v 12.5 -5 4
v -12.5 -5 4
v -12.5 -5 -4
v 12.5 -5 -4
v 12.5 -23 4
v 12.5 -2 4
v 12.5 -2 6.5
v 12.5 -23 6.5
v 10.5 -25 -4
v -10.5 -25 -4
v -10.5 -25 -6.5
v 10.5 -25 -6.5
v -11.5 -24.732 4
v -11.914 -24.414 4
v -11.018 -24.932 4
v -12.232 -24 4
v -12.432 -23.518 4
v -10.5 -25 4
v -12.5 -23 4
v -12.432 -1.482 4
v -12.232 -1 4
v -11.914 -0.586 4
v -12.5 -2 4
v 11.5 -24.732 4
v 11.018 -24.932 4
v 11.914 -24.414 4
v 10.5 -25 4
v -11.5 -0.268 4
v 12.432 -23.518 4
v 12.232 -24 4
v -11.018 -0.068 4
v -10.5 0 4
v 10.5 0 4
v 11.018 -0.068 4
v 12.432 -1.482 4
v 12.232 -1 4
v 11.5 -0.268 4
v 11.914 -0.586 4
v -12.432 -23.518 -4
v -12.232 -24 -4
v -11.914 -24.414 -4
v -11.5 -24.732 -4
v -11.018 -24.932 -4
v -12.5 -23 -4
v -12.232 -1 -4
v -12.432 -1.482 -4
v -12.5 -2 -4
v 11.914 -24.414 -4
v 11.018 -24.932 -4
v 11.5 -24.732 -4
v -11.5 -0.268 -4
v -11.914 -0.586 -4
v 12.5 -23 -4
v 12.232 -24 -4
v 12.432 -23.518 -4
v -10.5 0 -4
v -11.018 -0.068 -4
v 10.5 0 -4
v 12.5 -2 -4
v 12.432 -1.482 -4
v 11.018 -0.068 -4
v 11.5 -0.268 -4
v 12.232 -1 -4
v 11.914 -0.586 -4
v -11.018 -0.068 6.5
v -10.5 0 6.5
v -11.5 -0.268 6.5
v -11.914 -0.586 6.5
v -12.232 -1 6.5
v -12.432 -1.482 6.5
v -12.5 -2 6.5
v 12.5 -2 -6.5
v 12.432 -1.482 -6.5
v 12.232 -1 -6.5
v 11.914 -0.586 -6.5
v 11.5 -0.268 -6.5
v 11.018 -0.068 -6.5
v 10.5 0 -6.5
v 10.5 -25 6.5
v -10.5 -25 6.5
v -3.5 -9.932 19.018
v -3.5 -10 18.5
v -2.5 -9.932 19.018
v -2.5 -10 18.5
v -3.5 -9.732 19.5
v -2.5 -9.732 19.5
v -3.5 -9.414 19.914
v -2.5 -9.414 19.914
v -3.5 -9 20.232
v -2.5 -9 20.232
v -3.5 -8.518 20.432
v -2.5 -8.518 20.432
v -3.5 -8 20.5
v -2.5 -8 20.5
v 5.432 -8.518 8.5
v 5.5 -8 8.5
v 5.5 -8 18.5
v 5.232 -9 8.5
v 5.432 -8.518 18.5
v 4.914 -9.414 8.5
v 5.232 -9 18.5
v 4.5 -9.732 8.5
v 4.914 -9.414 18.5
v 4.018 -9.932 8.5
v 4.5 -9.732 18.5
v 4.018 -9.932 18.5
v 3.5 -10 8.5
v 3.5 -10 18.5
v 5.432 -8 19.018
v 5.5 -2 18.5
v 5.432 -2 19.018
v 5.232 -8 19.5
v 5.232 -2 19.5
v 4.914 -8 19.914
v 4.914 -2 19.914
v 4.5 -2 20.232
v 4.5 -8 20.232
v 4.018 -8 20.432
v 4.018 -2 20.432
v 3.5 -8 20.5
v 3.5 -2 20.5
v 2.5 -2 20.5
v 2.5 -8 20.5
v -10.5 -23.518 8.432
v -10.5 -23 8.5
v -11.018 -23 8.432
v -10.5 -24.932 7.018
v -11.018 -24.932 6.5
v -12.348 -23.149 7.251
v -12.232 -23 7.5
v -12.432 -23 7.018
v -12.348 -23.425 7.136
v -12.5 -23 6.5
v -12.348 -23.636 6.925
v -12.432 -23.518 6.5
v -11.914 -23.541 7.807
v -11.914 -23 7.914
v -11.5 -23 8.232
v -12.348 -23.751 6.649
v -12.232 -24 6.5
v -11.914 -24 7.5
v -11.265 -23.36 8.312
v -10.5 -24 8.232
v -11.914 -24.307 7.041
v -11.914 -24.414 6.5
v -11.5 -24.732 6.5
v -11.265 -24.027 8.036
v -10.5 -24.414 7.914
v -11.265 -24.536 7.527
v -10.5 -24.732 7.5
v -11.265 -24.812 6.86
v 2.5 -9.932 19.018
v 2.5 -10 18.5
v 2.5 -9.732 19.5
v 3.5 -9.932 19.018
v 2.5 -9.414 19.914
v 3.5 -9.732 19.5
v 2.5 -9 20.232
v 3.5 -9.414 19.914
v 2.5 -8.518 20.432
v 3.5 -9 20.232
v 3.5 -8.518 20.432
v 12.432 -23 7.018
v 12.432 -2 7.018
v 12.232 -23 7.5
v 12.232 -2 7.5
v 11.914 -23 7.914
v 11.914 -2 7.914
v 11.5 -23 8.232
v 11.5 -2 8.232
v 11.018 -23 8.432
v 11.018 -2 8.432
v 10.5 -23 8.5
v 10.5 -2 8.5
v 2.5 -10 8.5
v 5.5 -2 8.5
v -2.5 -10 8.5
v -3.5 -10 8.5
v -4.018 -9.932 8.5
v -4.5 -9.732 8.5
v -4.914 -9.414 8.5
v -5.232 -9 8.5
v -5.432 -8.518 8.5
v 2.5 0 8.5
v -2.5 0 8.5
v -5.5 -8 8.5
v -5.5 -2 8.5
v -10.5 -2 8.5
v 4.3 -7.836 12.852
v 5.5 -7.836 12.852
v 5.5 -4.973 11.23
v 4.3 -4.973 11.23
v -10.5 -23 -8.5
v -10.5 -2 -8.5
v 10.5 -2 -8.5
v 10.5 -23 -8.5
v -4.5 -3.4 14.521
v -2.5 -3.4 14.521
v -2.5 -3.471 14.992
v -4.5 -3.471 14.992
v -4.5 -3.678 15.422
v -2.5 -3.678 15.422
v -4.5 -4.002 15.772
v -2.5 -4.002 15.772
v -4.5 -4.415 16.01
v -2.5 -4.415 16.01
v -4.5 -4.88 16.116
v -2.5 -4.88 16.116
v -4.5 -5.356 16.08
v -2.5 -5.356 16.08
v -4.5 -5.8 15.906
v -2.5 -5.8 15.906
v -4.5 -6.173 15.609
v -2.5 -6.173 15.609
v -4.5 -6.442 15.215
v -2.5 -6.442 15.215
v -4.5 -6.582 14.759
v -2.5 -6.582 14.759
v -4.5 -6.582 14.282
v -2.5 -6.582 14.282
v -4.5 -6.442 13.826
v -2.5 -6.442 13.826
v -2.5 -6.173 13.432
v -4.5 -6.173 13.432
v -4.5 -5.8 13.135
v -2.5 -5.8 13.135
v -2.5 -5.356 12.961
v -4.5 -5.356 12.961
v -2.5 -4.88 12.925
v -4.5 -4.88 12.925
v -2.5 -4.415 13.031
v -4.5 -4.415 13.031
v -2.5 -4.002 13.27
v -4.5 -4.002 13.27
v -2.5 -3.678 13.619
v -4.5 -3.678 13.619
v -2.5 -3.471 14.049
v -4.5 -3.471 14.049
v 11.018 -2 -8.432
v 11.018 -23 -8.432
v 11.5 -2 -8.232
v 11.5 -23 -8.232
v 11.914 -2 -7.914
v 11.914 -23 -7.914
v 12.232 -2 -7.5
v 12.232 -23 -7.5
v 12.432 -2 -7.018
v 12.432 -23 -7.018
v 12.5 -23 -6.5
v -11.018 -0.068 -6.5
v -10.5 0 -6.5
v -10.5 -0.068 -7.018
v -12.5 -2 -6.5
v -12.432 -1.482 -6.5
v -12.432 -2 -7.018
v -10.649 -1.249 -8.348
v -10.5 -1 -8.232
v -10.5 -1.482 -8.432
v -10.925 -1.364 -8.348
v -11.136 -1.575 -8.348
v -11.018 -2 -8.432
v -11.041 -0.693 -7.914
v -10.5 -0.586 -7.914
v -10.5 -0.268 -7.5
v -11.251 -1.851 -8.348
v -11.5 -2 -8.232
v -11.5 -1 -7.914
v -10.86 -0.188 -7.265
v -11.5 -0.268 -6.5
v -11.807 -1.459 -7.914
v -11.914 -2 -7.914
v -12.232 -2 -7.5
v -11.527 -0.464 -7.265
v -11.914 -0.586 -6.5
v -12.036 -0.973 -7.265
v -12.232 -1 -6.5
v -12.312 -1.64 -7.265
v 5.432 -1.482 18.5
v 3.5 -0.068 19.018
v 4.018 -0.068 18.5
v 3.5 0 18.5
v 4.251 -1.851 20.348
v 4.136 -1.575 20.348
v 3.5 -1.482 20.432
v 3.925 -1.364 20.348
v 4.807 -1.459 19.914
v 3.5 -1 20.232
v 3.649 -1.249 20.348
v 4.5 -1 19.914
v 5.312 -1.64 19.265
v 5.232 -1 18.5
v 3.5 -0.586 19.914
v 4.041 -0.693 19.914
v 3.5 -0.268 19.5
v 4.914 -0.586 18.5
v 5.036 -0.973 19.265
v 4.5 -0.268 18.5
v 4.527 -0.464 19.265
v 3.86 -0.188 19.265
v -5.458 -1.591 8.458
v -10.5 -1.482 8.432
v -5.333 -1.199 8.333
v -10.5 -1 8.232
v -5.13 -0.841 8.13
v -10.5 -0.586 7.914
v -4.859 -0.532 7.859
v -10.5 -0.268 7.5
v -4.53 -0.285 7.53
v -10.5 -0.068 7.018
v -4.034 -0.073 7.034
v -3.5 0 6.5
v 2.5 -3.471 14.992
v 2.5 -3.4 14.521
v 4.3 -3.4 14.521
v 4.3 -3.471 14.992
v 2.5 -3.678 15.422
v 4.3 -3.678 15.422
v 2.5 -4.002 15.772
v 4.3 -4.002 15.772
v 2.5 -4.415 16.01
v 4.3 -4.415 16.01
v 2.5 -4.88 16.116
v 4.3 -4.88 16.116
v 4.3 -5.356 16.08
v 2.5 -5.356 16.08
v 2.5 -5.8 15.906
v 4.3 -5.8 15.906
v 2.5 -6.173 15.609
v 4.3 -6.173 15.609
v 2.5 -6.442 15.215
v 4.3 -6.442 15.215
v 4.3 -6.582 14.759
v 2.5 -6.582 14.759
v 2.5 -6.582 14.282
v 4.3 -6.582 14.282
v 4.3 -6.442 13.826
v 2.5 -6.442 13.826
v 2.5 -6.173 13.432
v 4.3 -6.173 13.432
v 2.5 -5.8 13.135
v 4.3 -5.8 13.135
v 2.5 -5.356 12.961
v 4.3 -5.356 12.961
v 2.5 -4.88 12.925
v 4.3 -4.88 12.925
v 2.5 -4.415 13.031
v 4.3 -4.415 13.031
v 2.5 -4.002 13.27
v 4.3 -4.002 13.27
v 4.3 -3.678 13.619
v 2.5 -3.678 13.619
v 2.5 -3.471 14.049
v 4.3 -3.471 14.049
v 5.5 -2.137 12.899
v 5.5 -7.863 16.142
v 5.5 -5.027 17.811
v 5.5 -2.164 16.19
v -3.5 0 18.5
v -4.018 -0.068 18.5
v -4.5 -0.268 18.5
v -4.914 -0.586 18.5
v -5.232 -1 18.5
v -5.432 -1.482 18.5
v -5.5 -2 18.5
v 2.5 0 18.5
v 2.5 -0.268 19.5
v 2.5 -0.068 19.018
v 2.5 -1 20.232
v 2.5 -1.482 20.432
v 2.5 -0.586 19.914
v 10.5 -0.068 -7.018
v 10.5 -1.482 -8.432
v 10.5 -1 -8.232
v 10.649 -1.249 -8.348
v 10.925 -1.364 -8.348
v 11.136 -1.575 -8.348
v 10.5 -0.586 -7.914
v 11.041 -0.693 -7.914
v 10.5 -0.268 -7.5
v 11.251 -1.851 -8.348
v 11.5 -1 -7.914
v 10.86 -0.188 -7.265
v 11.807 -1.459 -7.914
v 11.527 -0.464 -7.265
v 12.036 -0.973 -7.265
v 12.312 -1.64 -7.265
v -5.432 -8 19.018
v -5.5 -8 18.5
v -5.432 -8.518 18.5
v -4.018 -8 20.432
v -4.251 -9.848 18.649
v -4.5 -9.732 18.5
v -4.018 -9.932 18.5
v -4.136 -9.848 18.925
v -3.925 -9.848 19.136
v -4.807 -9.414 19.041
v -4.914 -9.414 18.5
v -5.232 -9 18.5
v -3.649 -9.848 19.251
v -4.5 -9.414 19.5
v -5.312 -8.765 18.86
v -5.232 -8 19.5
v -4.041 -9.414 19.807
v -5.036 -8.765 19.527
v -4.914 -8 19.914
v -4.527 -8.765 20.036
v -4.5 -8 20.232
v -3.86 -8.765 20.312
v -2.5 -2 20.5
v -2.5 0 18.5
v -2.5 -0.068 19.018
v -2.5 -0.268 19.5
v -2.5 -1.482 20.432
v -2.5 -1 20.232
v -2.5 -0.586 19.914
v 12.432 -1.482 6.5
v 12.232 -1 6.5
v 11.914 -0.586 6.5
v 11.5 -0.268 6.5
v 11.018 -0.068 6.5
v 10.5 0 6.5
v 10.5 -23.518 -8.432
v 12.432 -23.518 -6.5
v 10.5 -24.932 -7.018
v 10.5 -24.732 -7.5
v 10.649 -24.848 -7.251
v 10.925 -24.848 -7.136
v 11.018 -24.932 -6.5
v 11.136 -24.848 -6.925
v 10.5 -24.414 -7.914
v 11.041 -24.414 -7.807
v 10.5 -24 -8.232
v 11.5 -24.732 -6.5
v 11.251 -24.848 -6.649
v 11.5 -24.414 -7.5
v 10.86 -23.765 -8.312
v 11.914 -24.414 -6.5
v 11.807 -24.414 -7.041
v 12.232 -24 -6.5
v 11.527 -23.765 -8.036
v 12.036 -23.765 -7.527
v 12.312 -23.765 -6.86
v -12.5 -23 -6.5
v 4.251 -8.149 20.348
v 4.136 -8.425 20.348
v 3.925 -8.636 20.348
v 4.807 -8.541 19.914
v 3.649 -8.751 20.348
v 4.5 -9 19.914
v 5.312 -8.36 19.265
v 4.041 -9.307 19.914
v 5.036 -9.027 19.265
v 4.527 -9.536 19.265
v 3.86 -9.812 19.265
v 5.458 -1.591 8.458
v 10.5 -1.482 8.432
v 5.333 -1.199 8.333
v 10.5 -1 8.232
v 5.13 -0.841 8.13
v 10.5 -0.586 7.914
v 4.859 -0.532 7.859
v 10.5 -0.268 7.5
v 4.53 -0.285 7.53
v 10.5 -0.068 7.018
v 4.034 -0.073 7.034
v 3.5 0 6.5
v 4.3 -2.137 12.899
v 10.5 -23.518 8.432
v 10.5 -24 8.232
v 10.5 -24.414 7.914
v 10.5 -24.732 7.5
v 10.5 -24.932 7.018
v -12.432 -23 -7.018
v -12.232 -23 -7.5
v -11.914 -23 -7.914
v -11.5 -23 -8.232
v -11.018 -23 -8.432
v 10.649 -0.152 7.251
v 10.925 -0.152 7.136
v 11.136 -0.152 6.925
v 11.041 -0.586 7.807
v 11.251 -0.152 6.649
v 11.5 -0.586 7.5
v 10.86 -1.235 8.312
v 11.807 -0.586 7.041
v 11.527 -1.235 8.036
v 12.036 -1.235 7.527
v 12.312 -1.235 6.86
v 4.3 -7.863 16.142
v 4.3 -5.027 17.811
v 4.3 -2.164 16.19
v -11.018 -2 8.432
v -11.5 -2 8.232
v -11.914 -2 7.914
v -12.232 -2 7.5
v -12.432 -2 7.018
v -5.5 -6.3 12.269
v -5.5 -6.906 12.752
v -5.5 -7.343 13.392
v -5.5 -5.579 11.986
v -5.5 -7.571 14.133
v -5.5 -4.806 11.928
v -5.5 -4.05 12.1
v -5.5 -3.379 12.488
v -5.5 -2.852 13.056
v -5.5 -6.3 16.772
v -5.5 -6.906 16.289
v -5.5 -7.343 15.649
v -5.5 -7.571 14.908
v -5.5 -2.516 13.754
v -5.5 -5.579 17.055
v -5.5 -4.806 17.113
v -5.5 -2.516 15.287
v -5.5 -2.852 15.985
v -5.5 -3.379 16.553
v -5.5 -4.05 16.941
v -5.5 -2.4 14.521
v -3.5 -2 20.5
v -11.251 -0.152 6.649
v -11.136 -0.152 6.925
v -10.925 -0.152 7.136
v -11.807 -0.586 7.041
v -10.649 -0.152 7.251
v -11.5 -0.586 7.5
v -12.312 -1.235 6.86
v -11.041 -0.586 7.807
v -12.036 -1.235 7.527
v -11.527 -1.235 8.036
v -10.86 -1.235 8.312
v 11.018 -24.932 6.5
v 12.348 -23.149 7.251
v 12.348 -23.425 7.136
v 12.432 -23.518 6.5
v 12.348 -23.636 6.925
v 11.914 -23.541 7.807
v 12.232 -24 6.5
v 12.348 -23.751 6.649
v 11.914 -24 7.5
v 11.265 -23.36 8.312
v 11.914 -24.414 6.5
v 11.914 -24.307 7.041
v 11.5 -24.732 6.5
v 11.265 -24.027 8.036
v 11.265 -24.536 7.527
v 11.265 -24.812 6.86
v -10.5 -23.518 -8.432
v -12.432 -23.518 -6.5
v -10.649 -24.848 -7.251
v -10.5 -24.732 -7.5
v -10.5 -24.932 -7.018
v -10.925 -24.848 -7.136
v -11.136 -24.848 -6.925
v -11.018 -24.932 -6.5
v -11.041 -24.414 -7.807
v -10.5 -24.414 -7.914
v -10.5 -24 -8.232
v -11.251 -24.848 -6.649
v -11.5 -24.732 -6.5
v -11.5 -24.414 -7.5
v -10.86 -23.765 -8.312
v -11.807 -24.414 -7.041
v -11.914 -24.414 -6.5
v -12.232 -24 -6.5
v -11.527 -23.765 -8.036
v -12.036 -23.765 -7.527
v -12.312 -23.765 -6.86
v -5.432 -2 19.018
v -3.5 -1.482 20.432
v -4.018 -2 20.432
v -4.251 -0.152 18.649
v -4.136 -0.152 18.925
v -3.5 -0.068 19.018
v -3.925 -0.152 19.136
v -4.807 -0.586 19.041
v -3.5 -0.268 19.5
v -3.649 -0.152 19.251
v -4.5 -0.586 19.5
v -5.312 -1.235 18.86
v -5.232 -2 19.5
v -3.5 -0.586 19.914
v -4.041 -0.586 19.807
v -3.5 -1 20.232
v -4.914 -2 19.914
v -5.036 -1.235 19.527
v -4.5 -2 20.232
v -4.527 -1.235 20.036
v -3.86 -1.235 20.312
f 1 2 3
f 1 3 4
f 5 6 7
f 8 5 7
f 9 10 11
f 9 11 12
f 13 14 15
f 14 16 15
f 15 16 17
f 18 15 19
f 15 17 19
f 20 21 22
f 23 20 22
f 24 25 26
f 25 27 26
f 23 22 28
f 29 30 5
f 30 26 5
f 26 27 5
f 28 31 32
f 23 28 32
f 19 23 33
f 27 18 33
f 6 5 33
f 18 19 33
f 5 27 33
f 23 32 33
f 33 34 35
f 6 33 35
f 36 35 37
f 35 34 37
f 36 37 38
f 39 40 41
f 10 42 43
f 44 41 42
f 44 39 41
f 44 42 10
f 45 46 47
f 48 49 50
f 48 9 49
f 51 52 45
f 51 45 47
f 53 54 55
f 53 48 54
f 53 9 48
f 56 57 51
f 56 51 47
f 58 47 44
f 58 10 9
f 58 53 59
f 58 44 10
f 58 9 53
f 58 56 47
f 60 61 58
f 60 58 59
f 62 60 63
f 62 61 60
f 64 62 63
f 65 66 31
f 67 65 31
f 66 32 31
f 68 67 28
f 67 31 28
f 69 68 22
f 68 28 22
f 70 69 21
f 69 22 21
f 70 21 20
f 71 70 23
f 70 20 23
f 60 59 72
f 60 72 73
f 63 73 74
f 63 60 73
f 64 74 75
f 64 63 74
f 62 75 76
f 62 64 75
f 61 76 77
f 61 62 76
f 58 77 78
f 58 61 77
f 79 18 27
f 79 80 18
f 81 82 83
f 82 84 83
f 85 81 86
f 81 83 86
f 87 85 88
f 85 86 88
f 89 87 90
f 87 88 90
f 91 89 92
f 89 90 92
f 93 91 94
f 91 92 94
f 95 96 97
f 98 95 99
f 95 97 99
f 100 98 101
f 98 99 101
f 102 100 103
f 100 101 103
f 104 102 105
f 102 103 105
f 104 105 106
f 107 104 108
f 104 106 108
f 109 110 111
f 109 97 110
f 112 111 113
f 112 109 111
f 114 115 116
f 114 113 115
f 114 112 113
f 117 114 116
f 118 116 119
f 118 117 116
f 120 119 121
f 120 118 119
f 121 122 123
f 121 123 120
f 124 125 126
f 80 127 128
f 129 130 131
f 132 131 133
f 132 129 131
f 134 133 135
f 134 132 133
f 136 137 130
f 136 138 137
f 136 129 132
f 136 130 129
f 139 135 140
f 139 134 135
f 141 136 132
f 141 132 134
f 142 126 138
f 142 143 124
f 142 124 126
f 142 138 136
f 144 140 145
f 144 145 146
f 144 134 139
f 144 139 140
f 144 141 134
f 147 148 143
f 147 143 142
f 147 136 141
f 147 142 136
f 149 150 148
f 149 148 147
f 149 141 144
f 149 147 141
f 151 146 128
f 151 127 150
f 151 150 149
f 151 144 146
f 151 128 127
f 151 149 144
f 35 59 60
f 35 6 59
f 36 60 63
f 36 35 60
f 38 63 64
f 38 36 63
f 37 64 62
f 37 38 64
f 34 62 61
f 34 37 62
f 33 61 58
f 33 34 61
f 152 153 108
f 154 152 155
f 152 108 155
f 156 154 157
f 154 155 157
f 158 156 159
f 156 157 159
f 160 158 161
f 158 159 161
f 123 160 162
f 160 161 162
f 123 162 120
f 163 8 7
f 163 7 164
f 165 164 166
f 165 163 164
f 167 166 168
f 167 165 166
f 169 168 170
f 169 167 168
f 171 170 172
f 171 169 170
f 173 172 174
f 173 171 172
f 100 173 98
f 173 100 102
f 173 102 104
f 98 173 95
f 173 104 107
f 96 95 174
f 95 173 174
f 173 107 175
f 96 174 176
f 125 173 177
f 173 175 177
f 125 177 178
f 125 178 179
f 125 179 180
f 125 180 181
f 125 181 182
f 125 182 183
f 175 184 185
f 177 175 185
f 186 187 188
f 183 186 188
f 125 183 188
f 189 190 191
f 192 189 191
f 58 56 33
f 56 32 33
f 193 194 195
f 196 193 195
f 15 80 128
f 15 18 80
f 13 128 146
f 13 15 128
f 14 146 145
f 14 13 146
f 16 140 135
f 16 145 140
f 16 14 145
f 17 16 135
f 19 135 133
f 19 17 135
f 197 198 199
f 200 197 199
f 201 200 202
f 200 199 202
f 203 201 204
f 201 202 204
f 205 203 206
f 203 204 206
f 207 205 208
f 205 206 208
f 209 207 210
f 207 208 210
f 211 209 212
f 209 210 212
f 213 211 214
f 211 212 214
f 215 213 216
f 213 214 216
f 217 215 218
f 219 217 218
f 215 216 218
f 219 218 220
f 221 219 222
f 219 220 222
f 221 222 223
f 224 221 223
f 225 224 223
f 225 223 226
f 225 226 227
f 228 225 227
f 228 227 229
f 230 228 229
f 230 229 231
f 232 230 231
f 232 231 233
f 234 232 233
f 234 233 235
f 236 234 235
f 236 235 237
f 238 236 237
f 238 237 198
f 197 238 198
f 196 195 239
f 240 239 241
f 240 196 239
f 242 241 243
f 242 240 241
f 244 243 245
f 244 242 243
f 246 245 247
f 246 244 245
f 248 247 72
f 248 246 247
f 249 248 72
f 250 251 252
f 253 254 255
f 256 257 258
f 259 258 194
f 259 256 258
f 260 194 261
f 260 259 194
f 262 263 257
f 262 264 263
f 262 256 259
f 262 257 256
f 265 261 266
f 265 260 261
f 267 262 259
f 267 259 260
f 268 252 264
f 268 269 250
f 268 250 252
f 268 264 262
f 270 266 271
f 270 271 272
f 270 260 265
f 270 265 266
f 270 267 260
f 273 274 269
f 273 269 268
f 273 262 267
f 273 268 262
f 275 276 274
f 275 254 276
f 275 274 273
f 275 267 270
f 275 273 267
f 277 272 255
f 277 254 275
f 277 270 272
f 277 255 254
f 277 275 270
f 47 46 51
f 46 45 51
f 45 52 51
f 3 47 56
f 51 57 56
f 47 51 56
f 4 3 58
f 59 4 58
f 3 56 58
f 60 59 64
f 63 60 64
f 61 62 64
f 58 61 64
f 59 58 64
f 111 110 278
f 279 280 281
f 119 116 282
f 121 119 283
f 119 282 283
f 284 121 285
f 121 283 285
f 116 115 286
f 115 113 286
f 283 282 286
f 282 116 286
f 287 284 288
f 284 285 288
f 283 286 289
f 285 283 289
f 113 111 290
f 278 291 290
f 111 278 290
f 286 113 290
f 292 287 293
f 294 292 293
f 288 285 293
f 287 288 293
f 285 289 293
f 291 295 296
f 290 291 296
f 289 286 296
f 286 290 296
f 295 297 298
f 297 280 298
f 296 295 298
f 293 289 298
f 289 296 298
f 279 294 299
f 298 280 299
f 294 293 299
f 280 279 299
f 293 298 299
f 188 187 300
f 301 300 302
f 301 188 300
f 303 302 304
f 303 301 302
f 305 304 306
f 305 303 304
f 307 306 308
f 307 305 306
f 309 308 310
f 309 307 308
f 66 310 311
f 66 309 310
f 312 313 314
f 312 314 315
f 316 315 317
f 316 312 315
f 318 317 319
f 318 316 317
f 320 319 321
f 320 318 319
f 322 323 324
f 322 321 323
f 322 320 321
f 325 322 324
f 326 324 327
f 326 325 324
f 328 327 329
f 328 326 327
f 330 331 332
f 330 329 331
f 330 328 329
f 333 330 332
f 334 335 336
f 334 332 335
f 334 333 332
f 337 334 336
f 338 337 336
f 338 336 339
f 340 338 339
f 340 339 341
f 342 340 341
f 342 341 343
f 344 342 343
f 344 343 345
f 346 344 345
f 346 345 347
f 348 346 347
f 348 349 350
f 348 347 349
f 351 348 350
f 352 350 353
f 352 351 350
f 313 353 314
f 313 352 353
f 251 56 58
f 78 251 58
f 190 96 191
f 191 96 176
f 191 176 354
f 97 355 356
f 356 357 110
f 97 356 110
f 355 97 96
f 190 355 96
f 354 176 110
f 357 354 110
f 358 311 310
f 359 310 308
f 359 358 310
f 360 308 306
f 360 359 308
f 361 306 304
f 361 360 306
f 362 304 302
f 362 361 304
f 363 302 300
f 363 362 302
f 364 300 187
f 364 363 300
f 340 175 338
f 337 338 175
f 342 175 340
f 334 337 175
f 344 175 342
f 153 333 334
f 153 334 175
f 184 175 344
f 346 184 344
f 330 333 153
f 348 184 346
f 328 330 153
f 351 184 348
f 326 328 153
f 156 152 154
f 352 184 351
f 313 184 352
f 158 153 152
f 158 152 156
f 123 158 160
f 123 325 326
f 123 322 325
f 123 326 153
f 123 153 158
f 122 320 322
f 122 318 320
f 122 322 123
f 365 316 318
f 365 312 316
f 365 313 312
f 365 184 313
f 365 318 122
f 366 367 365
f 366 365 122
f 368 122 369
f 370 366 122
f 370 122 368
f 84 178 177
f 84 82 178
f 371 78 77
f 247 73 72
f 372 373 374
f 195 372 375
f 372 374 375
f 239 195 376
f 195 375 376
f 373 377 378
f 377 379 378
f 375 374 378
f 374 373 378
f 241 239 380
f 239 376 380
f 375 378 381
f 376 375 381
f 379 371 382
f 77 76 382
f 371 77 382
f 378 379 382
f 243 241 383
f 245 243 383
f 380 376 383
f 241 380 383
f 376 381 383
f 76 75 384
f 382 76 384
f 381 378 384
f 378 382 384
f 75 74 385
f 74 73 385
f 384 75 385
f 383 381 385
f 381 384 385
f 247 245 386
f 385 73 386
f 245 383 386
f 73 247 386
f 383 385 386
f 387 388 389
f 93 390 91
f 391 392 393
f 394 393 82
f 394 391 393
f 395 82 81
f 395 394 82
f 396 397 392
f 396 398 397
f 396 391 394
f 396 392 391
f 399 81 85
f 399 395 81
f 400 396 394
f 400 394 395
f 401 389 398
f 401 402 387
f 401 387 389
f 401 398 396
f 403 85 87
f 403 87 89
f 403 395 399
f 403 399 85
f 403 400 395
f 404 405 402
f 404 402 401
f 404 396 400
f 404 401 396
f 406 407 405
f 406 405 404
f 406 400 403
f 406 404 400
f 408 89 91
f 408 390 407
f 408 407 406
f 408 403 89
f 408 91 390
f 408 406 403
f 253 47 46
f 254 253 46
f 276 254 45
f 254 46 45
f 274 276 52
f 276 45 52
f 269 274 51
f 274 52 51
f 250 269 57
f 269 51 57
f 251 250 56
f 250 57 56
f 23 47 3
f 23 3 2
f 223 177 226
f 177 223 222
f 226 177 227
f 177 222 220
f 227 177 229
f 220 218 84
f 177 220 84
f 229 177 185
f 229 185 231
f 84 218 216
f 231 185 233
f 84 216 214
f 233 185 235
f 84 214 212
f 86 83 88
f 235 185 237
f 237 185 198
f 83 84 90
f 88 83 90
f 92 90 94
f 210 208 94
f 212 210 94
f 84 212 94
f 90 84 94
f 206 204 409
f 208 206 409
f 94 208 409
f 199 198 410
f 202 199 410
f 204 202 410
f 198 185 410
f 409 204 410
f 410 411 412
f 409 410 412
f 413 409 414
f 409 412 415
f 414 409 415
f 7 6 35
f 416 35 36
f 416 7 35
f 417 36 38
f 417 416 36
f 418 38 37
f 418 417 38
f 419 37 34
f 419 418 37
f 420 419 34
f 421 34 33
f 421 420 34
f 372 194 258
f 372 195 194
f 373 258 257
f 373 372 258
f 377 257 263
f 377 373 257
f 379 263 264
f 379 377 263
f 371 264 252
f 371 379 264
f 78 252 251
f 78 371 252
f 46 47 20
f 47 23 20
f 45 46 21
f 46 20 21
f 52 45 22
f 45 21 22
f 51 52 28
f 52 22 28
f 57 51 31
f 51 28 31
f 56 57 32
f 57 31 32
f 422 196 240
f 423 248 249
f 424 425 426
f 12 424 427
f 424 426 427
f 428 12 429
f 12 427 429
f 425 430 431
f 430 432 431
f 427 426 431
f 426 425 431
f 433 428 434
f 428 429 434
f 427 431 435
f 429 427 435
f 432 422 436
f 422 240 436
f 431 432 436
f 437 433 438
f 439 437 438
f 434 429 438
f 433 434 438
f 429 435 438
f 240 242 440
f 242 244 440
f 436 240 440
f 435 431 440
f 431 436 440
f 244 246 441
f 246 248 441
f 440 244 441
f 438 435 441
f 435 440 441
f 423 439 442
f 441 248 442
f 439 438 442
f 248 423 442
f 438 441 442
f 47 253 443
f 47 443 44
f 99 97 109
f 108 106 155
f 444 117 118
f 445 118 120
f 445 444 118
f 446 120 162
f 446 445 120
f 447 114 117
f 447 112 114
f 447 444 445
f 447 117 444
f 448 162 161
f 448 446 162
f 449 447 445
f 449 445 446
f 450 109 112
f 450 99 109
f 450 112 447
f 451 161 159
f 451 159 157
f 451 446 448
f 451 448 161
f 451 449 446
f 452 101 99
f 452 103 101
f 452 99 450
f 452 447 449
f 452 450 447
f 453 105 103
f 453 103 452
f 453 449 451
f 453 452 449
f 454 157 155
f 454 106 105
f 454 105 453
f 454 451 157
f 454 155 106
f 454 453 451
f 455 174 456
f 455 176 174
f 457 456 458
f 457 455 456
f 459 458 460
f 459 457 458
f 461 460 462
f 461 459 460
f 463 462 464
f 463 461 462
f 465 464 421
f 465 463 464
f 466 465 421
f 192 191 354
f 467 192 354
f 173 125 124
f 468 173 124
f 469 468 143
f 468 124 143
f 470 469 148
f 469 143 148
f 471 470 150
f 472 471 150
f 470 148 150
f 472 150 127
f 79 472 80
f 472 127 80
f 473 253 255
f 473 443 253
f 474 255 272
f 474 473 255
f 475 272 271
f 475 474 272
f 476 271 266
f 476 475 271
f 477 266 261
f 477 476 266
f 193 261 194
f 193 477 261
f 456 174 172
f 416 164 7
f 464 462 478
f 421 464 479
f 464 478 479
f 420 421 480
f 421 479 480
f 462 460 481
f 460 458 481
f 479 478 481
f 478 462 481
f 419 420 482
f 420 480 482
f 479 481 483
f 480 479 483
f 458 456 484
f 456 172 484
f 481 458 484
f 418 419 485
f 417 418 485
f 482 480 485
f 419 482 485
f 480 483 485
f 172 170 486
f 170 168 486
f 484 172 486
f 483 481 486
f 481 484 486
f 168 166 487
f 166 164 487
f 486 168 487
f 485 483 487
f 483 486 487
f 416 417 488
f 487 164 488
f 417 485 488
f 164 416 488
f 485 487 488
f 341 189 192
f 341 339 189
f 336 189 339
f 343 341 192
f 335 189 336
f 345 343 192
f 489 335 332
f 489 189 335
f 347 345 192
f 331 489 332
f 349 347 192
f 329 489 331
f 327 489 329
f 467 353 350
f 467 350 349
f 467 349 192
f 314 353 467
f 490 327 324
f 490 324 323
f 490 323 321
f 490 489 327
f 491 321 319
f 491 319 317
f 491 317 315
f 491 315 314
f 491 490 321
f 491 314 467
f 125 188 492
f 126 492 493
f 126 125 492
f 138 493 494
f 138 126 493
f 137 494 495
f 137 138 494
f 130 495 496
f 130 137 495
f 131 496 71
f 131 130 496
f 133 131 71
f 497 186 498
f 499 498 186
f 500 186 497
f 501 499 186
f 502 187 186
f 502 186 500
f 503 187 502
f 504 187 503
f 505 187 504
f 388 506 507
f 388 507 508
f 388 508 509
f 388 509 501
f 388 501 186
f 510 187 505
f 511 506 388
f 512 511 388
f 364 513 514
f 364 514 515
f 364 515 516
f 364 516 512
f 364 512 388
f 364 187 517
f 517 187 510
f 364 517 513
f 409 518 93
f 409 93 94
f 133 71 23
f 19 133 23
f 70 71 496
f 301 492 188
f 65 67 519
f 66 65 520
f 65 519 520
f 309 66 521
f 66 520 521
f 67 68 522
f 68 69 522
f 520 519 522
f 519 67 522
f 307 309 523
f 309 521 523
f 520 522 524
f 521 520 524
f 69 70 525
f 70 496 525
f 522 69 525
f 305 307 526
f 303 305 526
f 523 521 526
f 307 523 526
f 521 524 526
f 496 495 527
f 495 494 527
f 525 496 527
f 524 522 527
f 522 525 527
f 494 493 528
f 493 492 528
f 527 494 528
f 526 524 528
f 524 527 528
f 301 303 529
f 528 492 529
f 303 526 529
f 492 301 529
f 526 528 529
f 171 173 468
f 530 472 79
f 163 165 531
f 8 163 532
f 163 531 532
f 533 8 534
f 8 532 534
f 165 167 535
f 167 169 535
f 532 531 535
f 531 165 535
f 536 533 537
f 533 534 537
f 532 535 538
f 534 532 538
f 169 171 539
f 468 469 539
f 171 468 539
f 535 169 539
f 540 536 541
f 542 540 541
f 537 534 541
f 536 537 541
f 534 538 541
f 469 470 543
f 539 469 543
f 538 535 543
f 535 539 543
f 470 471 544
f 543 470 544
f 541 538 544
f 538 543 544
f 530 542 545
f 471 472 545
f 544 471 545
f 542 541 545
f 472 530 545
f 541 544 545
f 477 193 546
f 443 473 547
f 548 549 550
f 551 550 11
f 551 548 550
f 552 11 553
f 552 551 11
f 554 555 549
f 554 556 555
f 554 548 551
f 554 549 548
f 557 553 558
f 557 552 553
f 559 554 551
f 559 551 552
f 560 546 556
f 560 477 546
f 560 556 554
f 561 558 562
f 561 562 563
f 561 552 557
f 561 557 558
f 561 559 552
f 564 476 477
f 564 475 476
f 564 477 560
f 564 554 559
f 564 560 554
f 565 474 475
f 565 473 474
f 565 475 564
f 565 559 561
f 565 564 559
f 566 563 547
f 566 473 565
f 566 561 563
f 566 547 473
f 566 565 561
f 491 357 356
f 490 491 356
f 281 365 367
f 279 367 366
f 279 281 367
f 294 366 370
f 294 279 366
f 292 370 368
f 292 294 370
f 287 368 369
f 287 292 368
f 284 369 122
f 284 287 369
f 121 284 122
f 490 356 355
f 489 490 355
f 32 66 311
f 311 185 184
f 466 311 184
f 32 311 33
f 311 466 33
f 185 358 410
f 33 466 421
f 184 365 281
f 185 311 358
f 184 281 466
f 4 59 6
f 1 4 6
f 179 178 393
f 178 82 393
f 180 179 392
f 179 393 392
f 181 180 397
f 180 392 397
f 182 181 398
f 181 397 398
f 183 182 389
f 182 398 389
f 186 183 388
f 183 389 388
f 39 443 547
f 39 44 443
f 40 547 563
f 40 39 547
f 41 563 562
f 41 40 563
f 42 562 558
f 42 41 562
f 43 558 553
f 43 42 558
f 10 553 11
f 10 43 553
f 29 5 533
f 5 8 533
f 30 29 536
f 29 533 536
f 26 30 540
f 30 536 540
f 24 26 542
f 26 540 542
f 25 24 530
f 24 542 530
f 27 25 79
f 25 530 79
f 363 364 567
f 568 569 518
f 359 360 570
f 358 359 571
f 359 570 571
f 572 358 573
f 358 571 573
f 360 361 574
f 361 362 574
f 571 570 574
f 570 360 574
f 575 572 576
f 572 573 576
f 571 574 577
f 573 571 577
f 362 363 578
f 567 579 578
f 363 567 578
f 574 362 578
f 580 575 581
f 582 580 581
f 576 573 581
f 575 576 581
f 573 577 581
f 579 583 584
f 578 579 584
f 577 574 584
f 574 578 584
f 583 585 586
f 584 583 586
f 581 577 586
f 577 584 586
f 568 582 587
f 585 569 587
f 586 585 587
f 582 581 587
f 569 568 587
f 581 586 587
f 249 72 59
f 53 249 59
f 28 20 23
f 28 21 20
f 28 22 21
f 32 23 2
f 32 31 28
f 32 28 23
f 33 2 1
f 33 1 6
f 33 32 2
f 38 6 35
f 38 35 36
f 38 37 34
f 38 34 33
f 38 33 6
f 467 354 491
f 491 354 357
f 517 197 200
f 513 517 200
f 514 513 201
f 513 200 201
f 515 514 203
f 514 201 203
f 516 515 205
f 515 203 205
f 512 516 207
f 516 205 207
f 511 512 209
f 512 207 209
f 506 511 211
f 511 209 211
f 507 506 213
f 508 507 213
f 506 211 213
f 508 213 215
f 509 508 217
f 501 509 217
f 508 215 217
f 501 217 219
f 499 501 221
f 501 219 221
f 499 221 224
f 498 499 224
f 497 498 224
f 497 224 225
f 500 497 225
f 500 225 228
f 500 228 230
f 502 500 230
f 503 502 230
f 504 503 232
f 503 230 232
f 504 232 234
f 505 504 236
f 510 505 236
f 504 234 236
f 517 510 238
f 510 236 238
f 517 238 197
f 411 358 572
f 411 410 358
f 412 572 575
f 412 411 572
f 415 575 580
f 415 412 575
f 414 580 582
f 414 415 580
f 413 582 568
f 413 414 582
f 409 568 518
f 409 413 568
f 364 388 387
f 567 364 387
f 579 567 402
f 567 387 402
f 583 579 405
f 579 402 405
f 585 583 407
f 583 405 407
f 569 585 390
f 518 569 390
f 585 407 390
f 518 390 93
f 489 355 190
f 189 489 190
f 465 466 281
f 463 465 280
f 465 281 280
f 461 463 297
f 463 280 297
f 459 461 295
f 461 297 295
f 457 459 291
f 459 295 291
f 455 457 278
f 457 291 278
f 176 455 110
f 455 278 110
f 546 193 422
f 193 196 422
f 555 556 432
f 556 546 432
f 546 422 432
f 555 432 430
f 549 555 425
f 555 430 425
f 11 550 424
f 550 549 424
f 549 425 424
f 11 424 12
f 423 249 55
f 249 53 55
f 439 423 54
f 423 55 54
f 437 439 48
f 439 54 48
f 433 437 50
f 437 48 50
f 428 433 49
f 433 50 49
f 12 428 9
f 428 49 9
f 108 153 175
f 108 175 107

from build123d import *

# Parameters (mm, degrees)
F0_W          = 25
F0_H          = 4.5
F1_DEPTH      = 25
F0_H_2        = 8
F2_DEPTH      = 5
F0_W_2        = 3
F0_H_3        = 12
F3_DEPTH      = 10
F5_DEPTH      = 11.2
F5_DEPTH_BACK = 25
F6_R          = 2
F6_2_R        = 2
F6_3_R        = 2
F7_SIZE       = 1
F9_DEPTH      = 1.2


with BuildPart() as f1:
    # F0 (on Front) → F1 (new body)
    with BuildSketch(Plane.XZ):
        with Locations((0, -6.25)):
            Rectangle(F0_W, F0_H)
    extrude(amount=F1_DEPTH)

    # F6
    f6_edges = [f1.edges().sort_by_distance(p)[0] for p in [
        (12.5, 0, -6.25),
        (-12.5, 0, -6.25),
        (0, 0, -8.5),
        (-12.5, -12.5, -8.5),
        (12.5, -12.5, -8.5),
        (0, -25, -8.5),
        (-12.5, -25, -6.25),
        (12.5, -25, -6.25),
    ]]
    fillet(f6_edges, radius=F6_R)


with BuildPart() as f1b:
    # F0 (on Front) → F1, piece 2 (new body)
    with BuildSketch(Plane.XZ):
        Polygon((12.5, 4), (12.5, 8.5), (5.5, 8.5), (2.5, 8.5), (-2.5, 8.5), (-5.5, 8.5), (-12.5, 8.5), (-12.5, 4), align=None)
    extrude(amount=F1_DEPTH)

    # F0 (on Front) → F3 (join)
    with BuildSketch(Plane.XZ):
        with Locations((4, 14.5)):
            Rectangle(F0_W_2, F0_H_3)
        with Locations((-4, 14.5)):
            Rectangle(F0_W_2, F0_H_3)
    extrude(amount=F3_DEPTH)

    # F4 (on Right) → F5 (cut, two sides)
    with BuildSketch(Plane.YZ) as f5_sk:
        with BuildLine():
            ThreePointArc((-6.6, 14.520585537), (-5, 12.920585537), (-3.4, 14.520585537))
            Line((-3.4, 14.520585537), (-6.6, 14.520585537))
        make_face()
        with BuildLine():
            Line((-6.6, 14.520585537), (-3.4, 14.520585537))
            ThreePointArc((-3.4, 14.520585537), (-5, 16.120585537), (-6.6, 14.520585537))
        make_face()
    extrude(amount=-F5_DEPTH, mode=Mode.SUBTRACT)
    extrude(f5_sk.sketch, amount=F5_DEPTH_BACK, mode=Mode.SUBTRACT)

    # F6#2
    f6_2_edges = [f1b.edges().sort_by_distance(p)[0] for p in [
        (-5.5, -5, 20.5),
        (0, -25, 8.5),
        (12.5, -12.5, 8.5),
        (-12.5, -12.5, 8.5),
        (-12.5, 0, 6.25),
        (-9, 0, 8.5),
        (9, 0, 8.5),
        (12.5, 0, 6.25),
        (-5.5, 0, 14.5),
        (-5.5, -10, 14.5),
        (5.5, 0, 14.5),
        (5.5, -10, 14.5),
        (12.5, -25, 6.25),
        (-12.5, -25, 6.25),
        (5.5, -5, 20.5),
        (4, -10, 20.5),
        (4, 0, 20.5),
        (-4, 0, 20.5),
        (-4, -10, 20.5),
    ]]
    fillet(f6_2_edges, radius=F6_2_R)

    # F7
    f7_edges = [f1b.edges().sort_by_distance(p)[0] for p in [
        (-5.5, -6.6, 14.520586),
    ]]
    chamfer(f7_edges, length=F7_SIZE)

    # F8 (on face) → F9 (cut)
    with BuildSketch(Plane.YZ.offset(5.5)):
        Polygon((-5.0271761454, 17.8113698594), (-7.8634908944, 16.1424424659), (-7.8363147489, 12.8516581434), (-4.9728238546, 11.2298012145), (-2.1365091056, 12.898728608), (-2.1636852511, 16.1895129305), align=None)
    extrude(amount=-F9_DEPTH, mode=Mode.SUBTRACT)


with BuildPart() as f2:
    # F0 (on Front) → F2 (new body)
    with BuildSketch(Plane.XZ):
        Rectangle(F0_W, F0_H_2)
    extrude(amount=F2_DEPTH)

    # F6#3
    f6_3_edges = [f2.edges().sort_by_distance(p)[0] for p in [
        (12.5, 0, 0),
        (-12.5, 0, 0),
    ]]
    fillet(f6_3_edges, radius=F6_3_R)


solid = Compound([f1.part, f1b.part, f2.part])
